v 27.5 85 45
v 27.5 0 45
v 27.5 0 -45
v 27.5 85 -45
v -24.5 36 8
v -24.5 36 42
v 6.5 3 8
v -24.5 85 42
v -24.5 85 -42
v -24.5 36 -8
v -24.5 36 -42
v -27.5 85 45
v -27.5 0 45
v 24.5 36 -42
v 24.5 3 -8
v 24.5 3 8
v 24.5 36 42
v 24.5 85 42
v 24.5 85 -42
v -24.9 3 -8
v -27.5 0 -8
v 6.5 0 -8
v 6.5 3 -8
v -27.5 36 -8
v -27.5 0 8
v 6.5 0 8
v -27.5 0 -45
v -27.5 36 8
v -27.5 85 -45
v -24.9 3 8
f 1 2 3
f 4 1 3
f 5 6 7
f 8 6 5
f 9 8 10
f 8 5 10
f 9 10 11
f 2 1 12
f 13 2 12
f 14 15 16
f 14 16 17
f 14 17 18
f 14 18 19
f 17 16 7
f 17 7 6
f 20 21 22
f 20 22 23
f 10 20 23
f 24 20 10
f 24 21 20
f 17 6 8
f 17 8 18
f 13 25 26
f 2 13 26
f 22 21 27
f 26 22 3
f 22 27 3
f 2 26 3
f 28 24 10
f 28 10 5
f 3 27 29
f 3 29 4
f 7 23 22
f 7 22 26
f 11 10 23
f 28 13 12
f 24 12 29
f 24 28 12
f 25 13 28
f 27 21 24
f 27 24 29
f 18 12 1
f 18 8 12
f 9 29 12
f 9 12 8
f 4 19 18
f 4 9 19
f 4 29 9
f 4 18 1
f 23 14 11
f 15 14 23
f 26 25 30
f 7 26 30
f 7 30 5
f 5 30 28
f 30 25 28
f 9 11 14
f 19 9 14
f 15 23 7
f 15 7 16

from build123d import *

# Parameters (mm, degrees)
SKETCH1_W           = 55
SKETCH1_H           = 90
BOSS_EXTRUDE1_DEPTH = 85
SHELL1_T            = -3
BOSS_EXTRUDE4_DEPTH = 87
SKETCH5_W           = 16
SKETCH5_H           = 72
CUT_EXTRUDE2_DEPTH  = 34
BOSS_EXTRUDE5_DEPTH = 52.4


with BuildPart() as part:
    # Sketch1 → Boss-Extrude1 (new body)
    with BuildSketch(Plane(origin=(0, 0, 0), x_dir=(1, 0, 0), z_dir=(0, 1, 0))):
        Rectangle(SKETCH1_W, SKETCH1_H)
    extrude(amount=BOSS_EXTRUDE1_DEPTH)

    # Shell1
    shell1_openings = [part.faces().sort_by_distance(p)[0] for p in [
        (0, 85, 0),
    ]]
    offset(amount=SHELL1_T, openings=shell1_openings, kind=Kind.INTERSECTION)

    # Sketch4 → Boss-Extrude4 (add)
    with BuildSketch(Plane.XY.offset(45)):
        Polygon((-24.5, 36), (6.5, 3), (-24.5, 3), align=None)
    extrude(amount=-BOSS_EXTRUDE4_DEPTH)

    # Sketch5 → Cut-Extrude2 (cut)
    with BuildSketch(Plane.ZY.offset(27.5)):
        Rectangle(SKETCH5_W, SKETCH5_H)
    extrude(amount=-CUT_EXTRUDE2_DEPTH, mode=Mode.SUBTRACT)

    # Sketch7 → Boss-Extrude5 (add)
    with BuildSketch(Plane(origin=(27.5, 0, 0), x_dir=(0, 0, -1), z_dir=(1, 0, 0))):
        Polygon((-42, 36), (-42, 3), (-8, 3), align=None)
        Polygon((8, 3), (42, 3), (42, 36), align=None)
    extrude(amount=-BOSS_EXTRUDE5_DEPTH)


solid = part.part
